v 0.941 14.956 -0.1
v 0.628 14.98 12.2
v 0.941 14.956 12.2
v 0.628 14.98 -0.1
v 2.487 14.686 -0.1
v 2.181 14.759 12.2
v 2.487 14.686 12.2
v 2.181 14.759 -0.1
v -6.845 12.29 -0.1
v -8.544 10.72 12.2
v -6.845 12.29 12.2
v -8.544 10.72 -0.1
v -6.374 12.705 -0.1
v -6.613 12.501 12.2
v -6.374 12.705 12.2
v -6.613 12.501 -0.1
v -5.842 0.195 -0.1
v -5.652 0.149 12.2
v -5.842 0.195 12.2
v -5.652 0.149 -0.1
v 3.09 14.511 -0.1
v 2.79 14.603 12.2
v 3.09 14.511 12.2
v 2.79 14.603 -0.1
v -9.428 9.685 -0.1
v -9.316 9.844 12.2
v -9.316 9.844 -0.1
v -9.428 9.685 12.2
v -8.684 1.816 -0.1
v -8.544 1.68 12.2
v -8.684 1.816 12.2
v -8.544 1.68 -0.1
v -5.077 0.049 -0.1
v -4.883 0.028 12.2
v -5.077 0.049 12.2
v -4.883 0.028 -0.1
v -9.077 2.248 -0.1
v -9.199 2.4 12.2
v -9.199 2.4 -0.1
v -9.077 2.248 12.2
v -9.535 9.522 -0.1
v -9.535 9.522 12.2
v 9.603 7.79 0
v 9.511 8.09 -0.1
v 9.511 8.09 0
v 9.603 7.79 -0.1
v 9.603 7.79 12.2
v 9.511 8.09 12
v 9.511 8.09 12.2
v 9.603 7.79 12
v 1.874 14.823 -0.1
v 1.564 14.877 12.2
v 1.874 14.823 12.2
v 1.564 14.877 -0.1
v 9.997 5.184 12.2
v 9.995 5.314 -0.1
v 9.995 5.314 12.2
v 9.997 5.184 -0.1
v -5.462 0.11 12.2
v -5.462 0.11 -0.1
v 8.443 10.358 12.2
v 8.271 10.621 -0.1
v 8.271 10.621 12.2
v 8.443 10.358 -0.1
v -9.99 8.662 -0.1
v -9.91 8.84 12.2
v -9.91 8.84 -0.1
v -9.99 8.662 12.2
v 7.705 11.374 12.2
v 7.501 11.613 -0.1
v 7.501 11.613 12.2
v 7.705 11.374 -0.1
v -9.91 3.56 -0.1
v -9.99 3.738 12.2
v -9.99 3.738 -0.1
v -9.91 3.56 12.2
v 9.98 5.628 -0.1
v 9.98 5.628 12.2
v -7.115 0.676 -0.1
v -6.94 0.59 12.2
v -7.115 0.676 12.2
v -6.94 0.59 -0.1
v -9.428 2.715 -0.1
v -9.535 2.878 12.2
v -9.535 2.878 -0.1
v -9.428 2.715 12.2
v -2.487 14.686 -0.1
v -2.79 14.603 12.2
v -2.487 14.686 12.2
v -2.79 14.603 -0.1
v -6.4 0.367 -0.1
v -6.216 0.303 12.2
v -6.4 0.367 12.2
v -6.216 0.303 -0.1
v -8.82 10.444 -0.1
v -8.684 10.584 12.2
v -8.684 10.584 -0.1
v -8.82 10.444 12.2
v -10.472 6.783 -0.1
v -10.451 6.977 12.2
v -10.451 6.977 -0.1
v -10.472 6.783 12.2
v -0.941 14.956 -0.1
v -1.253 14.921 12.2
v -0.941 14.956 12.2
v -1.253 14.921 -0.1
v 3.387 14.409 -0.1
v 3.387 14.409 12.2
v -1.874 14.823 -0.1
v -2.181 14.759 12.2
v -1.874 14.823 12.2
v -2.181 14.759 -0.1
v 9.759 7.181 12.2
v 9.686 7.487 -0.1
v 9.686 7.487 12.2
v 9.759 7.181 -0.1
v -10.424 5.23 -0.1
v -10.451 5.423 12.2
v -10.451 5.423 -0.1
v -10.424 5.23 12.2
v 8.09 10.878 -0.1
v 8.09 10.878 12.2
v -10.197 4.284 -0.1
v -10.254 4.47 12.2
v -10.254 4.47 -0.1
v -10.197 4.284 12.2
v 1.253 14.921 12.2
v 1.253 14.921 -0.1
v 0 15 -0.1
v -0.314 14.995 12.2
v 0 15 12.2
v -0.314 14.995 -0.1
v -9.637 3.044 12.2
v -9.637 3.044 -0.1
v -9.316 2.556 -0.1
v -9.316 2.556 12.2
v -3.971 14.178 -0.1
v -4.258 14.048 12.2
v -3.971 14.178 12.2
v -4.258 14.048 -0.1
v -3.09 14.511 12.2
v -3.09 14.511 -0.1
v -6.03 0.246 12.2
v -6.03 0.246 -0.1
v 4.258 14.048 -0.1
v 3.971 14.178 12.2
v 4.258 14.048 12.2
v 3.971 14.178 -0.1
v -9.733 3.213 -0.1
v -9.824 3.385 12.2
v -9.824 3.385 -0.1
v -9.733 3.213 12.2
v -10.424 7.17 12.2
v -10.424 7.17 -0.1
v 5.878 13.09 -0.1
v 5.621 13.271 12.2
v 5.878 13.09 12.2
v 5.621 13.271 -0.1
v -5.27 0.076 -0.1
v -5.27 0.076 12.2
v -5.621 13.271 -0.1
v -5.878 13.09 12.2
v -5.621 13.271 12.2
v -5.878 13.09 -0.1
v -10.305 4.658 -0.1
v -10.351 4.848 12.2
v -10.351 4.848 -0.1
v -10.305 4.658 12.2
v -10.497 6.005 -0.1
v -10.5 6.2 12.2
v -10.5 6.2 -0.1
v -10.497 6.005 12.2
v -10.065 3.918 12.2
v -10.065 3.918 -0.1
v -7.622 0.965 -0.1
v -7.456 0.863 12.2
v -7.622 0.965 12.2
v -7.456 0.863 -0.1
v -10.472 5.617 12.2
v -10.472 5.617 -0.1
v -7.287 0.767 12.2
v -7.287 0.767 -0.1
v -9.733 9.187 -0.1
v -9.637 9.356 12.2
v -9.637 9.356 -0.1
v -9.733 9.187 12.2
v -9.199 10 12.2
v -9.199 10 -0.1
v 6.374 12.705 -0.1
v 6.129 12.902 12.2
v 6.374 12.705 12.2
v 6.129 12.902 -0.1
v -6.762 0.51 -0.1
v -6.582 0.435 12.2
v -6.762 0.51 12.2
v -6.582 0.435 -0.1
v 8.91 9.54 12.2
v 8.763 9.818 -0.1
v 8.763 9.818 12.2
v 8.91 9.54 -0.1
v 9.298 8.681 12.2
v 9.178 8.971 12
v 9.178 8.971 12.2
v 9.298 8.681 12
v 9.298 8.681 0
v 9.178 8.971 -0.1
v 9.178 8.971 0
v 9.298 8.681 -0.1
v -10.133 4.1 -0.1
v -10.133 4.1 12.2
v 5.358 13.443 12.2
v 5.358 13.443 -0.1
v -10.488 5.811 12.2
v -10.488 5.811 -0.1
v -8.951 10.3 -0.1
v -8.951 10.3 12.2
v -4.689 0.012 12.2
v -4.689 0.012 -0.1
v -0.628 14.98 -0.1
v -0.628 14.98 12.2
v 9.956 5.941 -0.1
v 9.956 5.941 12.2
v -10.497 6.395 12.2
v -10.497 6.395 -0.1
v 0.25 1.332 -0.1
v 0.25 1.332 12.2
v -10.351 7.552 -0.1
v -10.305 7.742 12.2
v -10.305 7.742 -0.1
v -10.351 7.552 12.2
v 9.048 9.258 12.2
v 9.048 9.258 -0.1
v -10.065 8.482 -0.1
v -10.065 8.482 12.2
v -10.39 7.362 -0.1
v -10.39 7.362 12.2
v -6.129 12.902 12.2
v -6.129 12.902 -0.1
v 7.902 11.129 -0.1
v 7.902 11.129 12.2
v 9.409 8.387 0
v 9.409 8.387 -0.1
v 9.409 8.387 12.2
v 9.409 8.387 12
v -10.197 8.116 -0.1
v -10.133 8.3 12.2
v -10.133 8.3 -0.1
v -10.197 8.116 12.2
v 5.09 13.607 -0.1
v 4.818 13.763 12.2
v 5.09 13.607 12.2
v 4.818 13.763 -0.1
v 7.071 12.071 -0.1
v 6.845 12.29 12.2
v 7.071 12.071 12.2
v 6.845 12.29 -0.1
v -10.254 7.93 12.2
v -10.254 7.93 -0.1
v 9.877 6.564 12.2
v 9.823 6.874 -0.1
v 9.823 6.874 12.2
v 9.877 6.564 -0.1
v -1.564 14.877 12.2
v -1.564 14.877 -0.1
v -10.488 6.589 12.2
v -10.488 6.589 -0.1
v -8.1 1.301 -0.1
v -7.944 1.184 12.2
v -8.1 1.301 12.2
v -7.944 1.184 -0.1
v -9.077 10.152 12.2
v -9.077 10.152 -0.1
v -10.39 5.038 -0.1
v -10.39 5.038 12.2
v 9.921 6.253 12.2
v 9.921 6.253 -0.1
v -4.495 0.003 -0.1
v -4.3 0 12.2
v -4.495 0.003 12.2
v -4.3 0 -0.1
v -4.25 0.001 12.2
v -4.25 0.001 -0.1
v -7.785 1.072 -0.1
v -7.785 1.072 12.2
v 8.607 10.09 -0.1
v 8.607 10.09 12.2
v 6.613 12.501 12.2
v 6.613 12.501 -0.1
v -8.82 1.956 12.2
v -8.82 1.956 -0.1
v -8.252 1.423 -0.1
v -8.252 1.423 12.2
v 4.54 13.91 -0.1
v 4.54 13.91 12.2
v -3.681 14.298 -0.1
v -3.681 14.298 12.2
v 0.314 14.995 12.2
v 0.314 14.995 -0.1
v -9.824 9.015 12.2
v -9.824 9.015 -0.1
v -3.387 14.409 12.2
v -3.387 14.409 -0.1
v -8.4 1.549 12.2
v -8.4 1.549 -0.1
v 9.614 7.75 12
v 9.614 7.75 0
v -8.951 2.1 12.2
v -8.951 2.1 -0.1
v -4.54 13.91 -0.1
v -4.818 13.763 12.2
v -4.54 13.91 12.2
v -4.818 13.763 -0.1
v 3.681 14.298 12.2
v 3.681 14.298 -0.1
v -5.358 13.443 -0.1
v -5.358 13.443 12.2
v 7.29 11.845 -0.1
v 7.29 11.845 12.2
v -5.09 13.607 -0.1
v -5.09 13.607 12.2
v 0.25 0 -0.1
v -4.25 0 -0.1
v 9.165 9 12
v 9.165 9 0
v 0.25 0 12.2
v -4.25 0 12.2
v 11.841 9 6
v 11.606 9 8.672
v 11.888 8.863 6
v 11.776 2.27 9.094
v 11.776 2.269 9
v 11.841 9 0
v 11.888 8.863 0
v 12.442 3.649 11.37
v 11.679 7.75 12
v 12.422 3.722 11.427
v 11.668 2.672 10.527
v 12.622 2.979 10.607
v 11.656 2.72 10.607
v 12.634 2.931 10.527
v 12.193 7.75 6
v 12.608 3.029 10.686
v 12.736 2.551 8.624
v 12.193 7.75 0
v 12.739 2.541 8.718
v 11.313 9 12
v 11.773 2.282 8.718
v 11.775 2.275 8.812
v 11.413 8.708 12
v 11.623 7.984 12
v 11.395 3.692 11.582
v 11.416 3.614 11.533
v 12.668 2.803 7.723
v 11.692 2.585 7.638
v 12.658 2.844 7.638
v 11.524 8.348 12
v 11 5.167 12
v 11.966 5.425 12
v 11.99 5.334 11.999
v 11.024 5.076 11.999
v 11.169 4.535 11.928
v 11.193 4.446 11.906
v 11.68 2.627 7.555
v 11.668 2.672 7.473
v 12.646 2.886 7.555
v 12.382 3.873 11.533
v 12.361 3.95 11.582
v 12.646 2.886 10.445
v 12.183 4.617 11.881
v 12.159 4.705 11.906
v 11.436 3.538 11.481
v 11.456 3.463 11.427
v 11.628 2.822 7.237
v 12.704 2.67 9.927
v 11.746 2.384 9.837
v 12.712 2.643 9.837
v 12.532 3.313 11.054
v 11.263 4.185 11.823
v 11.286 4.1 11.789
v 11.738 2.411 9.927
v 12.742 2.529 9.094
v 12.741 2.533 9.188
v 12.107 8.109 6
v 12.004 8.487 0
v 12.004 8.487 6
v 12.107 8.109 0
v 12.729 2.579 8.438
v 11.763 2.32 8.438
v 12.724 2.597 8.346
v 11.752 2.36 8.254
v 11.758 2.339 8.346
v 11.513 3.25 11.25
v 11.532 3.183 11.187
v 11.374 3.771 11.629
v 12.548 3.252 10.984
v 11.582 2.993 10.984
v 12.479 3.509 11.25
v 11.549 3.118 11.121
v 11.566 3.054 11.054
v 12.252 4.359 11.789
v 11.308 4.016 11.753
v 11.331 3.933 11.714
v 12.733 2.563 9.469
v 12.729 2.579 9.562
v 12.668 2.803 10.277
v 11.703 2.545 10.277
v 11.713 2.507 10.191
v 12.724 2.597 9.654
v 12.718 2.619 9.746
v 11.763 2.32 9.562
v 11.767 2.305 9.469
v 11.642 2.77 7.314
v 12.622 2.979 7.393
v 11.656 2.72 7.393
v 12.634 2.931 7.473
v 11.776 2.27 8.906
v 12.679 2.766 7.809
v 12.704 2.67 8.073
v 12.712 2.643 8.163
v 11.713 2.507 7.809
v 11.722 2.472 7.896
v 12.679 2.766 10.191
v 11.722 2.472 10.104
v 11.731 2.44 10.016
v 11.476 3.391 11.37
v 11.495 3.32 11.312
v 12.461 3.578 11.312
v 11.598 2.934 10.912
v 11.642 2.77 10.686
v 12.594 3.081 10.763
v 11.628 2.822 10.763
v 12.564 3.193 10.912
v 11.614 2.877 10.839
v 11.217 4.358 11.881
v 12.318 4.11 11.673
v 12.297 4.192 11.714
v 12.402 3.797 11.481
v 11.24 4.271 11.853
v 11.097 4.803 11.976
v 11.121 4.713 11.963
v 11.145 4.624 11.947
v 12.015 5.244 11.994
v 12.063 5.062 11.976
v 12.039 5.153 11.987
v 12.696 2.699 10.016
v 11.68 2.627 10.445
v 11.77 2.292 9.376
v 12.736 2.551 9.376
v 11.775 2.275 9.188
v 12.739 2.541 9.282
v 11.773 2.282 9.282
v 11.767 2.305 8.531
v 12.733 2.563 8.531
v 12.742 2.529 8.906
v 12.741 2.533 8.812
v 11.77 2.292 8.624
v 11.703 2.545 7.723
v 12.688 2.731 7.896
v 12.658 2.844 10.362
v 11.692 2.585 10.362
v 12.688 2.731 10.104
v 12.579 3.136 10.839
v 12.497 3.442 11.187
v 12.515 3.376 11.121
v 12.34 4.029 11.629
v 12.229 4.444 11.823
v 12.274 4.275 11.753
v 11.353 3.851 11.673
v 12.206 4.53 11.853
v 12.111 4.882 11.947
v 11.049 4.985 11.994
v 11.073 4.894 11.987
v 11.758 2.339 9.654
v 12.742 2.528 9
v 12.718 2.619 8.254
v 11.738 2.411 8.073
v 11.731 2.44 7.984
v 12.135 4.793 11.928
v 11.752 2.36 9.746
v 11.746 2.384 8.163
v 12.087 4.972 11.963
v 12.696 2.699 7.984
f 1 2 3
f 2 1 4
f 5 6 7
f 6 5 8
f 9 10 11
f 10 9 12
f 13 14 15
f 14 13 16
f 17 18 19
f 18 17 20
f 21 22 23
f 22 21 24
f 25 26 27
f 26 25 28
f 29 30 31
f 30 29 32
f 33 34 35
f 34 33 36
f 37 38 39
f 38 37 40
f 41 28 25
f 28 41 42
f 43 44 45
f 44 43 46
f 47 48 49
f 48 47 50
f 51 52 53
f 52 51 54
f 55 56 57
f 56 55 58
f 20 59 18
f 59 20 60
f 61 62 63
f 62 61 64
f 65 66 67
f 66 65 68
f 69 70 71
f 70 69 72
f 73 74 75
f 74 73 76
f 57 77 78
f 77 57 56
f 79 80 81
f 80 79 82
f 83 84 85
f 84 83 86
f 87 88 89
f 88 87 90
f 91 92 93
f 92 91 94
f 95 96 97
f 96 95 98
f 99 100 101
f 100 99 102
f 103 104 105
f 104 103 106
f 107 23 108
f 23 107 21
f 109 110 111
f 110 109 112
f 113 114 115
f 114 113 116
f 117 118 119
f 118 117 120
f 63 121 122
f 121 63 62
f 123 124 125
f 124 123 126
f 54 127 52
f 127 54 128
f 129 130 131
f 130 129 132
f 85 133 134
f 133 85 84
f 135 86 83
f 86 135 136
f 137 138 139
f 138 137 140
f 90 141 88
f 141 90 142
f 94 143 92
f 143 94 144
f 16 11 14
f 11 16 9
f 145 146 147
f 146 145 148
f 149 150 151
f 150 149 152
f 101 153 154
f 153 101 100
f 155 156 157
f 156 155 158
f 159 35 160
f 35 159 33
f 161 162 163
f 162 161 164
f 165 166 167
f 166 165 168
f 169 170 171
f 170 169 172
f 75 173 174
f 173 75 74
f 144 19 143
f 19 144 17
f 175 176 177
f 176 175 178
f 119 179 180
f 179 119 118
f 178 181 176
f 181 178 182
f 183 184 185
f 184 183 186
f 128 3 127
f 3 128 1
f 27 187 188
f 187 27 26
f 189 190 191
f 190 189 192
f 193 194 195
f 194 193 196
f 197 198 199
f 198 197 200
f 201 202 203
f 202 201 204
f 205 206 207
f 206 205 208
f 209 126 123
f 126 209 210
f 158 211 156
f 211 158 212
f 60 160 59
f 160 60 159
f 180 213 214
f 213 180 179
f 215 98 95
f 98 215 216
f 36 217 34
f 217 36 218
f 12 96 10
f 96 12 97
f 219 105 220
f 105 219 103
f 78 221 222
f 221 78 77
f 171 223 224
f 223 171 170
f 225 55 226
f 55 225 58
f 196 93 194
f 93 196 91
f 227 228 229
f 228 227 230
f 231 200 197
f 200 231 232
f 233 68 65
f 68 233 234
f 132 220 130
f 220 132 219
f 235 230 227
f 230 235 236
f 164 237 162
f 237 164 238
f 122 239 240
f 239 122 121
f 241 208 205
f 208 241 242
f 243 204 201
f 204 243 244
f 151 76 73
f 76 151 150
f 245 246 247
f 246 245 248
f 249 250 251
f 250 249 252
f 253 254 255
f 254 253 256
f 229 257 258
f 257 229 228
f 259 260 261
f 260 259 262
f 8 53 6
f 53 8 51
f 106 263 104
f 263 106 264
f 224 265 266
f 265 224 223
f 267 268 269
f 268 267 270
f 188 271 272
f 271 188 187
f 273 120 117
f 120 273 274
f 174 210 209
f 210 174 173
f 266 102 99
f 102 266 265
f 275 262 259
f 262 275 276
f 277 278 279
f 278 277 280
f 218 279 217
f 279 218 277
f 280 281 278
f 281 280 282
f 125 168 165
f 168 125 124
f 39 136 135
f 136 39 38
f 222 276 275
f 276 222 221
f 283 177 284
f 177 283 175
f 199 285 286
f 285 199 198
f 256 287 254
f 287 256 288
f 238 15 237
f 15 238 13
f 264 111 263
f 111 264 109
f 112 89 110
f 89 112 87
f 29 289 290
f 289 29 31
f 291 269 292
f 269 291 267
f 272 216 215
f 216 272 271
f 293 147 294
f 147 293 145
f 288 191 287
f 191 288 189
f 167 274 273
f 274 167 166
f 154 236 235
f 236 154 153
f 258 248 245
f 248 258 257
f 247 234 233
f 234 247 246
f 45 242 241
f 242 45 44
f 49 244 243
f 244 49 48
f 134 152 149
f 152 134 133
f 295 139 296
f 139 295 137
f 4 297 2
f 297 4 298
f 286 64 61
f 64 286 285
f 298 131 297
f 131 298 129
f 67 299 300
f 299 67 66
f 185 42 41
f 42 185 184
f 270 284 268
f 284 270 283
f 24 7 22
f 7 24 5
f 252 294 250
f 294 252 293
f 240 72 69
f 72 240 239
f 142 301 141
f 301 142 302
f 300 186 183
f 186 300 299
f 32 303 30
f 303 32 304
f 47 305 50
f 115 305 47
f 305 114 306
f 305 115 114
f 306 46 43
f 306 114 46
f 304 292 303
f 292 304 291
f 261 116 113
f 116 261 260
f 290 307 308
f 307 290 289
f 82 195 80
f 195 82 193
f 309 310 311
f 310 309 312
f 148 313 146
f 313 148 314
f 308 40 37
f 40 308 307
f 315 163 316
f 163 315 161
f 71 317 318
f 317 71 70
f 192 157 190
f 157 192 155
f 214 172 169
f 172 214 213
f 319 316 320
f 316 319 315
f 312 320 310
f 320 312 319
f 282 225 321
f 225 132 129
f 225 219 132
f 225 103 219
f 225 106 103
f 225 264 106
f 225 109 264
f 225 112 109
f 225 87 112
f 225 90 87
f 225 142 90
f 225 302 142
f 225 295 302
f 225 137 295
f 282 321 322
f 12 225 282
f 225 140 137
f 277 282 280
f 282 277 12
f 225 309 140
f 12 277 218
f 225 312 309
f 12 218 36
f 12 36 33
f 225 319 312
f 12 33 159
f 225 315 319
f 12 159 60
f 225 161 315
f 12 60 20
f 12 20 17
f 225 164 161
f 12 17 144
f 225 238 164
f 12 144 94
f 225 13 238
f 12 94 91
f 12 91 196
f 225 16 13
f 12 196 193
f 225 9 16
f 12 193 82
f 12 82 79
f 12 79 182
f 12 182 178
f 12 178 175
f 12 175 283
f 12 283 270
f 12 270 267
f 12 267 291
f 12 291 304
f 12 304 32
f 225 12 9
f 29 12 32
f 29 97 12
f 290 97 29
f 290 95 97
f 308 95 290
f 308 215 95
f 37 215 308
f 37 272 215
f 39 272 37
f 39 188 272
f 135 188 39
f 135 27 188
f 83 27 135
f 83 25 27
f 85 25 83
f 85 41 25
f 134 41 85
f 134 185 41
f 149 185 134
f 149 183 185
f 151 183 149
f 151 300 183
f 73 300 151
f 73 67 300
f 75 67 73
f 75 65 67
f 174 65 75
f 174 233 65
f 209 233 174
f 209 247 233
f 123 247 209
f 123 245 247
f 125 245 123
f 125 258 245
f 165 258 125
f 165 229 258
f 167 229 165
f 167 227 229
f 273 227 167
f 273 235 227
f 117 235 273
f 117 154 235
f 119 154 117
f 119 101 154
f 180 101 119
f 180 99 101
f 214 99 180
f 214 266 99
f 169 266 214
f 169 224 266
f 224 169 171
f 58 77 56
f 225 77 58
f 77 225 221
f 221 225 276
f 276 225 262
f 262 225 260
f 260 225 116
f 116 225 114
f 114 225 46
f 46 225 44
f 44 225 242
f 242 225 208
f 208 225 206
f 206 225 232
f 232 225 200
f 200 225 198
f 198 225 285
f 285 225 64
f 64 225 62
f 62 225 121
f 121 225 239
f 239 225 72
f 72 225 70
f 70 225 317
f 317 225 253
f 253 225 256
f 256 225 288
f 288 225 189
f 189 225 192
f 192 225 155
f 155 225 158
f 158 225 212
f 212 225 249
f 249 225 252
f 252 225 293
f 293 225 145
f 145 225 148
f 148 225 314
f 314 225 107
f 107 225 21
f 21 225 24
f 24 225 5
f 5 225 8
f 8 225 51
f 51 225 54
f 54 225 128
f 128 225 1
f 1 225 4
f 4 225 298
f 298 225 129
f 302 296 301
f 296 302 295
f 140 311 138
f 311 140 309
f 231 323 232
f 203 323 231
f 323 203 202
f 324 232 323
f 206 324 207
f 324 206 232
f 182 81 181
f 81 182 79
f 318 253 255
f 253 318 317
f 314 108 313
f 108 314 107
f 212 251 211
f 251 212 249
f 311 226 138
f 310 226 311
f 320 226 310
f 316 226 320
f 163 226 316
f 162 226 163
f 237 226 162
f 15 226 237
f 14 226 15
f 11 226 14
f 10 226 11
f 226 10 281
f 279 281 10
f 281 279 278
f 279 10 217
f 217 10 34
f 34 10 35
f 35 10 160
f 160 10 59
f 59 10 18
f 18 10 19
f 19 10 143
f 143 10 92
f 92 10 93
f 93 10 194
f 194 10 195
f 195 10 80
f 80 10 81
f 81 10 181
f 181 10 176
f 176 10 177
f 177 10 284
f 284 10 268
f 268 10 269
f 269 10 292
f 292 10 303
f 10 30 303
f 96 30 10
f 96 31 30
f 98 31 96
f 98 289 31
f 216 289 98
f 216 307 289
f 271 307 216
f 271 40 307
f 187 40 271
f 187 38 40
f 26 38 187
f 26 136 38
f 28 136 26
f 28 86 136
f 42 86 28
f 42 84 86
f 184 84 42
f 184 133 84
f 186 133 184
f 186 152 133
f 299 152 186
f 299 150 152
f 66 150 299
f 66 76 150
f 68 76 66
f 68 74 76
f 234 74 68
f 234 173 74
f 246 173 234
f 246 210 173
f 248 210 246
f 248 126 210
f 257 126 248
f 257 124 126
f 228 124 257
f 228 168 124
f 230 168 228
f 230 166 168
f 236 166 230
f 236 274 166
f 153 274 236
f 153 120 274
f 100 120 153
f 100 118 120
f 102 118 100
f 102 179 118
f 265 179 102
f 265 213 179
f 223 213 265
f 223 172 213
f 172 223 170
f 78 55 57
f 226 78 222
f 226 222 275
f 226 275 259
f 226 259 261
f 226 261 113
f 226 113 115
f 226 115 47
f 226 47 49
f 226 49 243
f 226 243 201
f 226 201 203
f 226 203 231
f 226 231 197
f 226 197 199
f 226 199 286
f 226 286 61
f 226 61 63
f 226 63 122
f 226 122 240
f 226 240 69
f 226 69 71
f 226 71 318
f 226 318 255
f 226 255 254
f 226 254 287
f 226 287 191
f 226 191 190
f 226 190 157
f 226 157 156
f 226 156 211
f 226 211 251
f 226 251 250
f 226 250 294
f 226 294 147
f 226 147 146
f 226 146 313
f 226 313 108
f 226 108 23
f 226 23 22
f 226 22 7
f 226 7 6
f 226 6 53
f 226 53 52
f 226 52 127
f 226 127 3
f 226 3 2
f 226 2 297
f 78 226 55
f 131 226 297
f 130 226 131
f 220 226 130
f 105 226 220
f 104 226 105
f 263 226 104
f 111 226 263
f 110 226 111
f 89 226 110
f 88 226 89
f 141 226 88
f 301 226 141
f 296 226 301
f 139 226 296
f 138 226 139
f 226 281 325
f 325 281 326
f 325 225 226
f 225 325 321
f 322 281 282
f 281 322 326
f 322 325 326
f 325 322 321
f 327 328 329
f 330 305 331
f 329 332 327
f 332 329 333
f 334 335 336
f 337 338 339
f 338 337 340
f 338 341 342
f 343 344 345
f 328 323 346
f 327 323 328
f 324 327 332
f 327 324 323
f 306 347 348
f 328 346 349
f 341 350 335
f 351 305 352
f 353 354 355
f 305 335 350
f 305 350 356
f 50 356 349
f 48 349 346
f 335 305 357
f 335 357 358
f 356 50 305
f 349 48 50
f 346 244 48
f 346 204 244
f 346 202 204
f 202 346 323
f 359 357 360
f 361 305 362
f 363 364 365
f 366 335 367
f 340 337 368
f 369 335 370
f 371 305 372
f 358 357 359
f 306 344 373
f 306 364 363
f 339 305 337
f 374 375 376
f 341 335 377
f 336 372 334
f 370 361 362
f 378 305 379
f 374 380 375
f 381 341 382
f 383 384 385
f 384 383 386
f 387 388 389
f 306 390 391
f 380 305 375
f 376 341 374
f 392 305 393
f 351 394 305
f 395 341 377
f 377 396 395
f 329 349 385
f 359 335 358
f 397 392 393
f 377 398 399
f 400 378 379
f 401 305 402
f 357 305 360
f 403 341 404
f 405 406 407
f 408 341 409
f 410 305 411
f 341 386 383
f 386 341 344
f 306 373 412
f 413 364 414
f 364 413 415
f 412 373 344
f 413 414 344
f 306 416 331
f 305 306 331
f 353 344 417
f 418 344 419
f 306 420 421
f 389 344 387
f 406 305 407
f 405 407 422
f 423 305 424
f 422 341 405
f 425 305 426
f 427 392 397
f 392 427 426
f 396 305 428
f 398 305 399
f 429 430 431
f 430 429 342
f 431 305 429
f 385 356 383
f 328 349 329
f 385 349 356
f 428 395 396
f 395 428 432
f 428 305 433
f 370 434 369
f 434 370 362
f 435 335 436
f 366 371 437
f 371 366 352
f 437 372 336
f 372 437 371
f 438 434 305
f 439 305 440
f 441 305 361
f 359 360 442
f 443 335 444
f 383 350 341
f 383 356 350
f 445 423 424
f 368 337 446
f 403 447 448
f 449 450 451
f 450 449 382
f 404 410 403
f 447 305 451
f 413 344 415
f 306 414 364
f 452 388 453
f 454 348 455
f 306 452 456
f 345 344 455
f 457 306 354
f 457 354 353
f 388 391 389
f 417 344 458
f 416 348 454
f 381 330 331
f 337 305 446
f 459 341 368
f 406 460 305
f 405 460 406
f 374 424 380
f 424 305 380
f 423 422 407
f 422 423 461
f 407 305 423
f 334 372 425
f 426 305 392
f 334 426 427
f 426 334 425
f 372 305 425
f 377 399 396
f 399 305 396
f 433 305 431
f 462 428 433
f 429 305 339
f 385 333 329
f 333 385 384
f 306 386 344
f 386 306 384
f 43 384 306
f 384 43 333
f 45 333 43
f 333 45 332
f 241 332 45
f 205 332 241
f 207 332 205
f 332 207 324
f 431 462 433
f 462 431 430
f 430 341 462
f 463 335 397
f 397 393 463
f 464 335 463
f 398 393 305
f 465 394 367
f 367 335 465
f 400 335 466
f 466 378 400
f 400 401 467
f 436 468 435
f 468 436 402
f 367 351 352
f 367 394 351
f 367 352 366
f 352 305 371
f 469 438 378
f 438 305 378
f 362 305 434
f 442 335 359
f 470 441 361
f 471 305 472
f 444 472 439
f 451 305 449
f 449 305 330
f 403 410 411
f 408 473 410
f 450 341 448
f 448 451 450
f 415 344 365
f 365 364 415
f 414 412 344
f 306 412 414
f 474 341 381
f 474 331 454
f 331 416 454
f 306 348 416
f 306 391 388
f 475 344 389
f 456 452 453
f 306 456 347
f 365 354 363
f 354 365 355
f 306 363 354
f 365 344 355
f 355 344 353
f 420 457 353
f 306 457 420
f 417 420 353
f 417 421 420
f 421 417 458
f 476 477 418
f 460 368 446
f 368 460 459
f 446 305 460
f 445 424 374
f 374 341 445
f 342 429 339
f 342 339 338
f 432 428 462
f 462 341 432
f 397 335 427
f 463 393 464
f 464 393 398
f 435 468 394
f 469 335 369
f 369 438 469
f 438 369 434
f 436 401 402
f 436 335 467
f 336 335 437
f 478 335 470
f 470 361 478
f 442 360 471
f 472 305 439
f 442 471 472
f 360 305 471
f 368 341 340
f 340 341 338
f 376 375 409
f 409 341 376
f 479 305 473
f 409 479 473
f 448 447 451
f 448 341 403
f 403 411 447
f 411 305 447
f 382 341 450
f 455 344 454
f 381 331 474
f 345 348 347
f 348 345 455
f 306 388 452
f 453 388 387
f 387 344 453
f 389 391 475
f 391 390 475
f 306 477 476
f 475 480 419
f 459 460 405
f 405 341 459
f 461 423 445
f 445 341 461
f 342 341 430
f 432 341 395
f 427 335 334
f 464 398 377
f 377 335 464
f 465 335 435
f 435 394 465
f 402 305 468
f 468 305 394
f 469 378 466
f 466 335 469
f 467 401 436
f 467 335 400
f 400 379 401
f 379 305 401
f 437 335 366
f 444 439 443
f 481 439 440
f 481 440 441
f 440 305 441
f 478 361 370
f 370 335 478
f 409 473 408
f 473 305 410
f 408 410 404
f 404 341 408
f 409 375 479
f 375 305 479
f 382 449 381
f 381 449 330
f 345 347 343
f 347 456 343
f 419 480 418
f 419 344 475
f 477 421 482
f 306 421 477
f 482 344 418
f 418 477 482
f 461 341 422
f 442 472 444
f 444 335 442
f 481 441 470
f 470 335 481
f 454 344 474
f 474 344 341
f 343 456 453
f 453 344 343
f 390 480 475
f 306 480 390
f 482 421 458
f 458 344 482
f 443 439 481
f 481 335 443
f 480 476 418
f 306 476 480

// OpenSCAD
$fn=200;

h=12.5;
l=9;
width=12;
w=width/2;
adj=0.95;

t=2;
dif=1;

pd=4;   //pick point diameter
pw=0.8; //pick thickness
ph=2;   //pick point height

fw=21;  //finger width
fh=15.5;  //finger height
d=fh/1.25;

//thumb_pick();
finger(w*2+.1,dif);

hull(){
    intersection(){
        thumb_pick();
        
        cube([20,9,15]);
    }    

    difference(){
        union(){
            translate([fw/2+.5, fh/3, w*1.5])
           // rotate([0,-3,0])
            rotate([-90,0,-75])
            cylinder(d=w, h=t/2);

        }
        
        translate([0, fh/2, -.1])
        cube([fw,fw,w*2+1]);
    }    
}

module thumb_pick(){
    difference(){
        union(){   
            difference(){
                hull(){
                    thumb(fw,w);
                    translate([0,0,w]) thumb(fw-dif,w);
                }
                //------------------------------------
                translate([-1, -fw, -.1])
                cube([fw,fw+fh/2,w*2+1]);
            }
            pick(w,1);
            translate([0,0,w]) pick(w,0);
        }
        //------------------------------------
        /*
        hull(){
            translate([0,0,2]) finger(w-2);
            finger(.2,-t*2+.6);
        }
        hull(){
            translate([0,0,w-1]) finger(1);
            translate([0,0,w]) finger(1,dif);
        }
        /**/
        translate([0,0,-.1]) finger(w*2+.1,dif);
    }
}


module thumb(df,w){
    translate([0, fh-fw/2, 0])
    difference(){
        cylinder(d=df+t*2, h=w);

        translate([-df, -df, -.1])
        cube([df*2,df,w+1]);
    }
/*    translate([-fw/2+d/2+adj, d/2, 0])
    cylinder(d=d+t*2, h=w);
    /**/
    translate([-fw/2+d/2, d/2, 0])
    cylinder(d=d+t*2, h=w);
    
}

module finger(w,dif=0){ 
    hull(){
        translate([-fw/2+d/2, d/2, -.1])
        cylinder(d=d, h=w+.2);

        difference(){
            translate([0, fh-fw/2,-.1])
            cylinder(d=fw-dif, h=w+.2);
            
            translate([-fw, -fw, -.1])
            rotate([0,0,-2])
            cube([fw*2,fw+h/2,w+.2]);
        }
    }
    translate([(fh-fw)/2-1.5, 0, -.1])
    cube([l/2,t*2,w+.2]);
}

module pick(w,p){
    if(p==1){
        // body
        hull(){
            translate([(h-fw)/2 -1, -t, 0])
            cube([5,t,w]);

            translate([(l-pd)/2, -t, 0])
            cube([.1,pw,w]);
        }
        // point
        hull(){
            translate([(l-pd)/2, -t, 0])
            cube([.1,pw,w*1.5]);
         
            translate([fw/2, -t, 0])
            cube([.1,pw,ph]);

            translate([fw/2+t/2+ph, -t, ph])
            rotate([-90,0,0])
            cylinder(d=pd, h=pw);
        }
    }else{
        hull(){
            translate([(h-fw)/2 -1, -t, 0])
            cube([5,t,w]);

            translate([(l-pd)/2, -t, 0])
            cube([.1,pw,w/2]);
        }
    }
}    
    
